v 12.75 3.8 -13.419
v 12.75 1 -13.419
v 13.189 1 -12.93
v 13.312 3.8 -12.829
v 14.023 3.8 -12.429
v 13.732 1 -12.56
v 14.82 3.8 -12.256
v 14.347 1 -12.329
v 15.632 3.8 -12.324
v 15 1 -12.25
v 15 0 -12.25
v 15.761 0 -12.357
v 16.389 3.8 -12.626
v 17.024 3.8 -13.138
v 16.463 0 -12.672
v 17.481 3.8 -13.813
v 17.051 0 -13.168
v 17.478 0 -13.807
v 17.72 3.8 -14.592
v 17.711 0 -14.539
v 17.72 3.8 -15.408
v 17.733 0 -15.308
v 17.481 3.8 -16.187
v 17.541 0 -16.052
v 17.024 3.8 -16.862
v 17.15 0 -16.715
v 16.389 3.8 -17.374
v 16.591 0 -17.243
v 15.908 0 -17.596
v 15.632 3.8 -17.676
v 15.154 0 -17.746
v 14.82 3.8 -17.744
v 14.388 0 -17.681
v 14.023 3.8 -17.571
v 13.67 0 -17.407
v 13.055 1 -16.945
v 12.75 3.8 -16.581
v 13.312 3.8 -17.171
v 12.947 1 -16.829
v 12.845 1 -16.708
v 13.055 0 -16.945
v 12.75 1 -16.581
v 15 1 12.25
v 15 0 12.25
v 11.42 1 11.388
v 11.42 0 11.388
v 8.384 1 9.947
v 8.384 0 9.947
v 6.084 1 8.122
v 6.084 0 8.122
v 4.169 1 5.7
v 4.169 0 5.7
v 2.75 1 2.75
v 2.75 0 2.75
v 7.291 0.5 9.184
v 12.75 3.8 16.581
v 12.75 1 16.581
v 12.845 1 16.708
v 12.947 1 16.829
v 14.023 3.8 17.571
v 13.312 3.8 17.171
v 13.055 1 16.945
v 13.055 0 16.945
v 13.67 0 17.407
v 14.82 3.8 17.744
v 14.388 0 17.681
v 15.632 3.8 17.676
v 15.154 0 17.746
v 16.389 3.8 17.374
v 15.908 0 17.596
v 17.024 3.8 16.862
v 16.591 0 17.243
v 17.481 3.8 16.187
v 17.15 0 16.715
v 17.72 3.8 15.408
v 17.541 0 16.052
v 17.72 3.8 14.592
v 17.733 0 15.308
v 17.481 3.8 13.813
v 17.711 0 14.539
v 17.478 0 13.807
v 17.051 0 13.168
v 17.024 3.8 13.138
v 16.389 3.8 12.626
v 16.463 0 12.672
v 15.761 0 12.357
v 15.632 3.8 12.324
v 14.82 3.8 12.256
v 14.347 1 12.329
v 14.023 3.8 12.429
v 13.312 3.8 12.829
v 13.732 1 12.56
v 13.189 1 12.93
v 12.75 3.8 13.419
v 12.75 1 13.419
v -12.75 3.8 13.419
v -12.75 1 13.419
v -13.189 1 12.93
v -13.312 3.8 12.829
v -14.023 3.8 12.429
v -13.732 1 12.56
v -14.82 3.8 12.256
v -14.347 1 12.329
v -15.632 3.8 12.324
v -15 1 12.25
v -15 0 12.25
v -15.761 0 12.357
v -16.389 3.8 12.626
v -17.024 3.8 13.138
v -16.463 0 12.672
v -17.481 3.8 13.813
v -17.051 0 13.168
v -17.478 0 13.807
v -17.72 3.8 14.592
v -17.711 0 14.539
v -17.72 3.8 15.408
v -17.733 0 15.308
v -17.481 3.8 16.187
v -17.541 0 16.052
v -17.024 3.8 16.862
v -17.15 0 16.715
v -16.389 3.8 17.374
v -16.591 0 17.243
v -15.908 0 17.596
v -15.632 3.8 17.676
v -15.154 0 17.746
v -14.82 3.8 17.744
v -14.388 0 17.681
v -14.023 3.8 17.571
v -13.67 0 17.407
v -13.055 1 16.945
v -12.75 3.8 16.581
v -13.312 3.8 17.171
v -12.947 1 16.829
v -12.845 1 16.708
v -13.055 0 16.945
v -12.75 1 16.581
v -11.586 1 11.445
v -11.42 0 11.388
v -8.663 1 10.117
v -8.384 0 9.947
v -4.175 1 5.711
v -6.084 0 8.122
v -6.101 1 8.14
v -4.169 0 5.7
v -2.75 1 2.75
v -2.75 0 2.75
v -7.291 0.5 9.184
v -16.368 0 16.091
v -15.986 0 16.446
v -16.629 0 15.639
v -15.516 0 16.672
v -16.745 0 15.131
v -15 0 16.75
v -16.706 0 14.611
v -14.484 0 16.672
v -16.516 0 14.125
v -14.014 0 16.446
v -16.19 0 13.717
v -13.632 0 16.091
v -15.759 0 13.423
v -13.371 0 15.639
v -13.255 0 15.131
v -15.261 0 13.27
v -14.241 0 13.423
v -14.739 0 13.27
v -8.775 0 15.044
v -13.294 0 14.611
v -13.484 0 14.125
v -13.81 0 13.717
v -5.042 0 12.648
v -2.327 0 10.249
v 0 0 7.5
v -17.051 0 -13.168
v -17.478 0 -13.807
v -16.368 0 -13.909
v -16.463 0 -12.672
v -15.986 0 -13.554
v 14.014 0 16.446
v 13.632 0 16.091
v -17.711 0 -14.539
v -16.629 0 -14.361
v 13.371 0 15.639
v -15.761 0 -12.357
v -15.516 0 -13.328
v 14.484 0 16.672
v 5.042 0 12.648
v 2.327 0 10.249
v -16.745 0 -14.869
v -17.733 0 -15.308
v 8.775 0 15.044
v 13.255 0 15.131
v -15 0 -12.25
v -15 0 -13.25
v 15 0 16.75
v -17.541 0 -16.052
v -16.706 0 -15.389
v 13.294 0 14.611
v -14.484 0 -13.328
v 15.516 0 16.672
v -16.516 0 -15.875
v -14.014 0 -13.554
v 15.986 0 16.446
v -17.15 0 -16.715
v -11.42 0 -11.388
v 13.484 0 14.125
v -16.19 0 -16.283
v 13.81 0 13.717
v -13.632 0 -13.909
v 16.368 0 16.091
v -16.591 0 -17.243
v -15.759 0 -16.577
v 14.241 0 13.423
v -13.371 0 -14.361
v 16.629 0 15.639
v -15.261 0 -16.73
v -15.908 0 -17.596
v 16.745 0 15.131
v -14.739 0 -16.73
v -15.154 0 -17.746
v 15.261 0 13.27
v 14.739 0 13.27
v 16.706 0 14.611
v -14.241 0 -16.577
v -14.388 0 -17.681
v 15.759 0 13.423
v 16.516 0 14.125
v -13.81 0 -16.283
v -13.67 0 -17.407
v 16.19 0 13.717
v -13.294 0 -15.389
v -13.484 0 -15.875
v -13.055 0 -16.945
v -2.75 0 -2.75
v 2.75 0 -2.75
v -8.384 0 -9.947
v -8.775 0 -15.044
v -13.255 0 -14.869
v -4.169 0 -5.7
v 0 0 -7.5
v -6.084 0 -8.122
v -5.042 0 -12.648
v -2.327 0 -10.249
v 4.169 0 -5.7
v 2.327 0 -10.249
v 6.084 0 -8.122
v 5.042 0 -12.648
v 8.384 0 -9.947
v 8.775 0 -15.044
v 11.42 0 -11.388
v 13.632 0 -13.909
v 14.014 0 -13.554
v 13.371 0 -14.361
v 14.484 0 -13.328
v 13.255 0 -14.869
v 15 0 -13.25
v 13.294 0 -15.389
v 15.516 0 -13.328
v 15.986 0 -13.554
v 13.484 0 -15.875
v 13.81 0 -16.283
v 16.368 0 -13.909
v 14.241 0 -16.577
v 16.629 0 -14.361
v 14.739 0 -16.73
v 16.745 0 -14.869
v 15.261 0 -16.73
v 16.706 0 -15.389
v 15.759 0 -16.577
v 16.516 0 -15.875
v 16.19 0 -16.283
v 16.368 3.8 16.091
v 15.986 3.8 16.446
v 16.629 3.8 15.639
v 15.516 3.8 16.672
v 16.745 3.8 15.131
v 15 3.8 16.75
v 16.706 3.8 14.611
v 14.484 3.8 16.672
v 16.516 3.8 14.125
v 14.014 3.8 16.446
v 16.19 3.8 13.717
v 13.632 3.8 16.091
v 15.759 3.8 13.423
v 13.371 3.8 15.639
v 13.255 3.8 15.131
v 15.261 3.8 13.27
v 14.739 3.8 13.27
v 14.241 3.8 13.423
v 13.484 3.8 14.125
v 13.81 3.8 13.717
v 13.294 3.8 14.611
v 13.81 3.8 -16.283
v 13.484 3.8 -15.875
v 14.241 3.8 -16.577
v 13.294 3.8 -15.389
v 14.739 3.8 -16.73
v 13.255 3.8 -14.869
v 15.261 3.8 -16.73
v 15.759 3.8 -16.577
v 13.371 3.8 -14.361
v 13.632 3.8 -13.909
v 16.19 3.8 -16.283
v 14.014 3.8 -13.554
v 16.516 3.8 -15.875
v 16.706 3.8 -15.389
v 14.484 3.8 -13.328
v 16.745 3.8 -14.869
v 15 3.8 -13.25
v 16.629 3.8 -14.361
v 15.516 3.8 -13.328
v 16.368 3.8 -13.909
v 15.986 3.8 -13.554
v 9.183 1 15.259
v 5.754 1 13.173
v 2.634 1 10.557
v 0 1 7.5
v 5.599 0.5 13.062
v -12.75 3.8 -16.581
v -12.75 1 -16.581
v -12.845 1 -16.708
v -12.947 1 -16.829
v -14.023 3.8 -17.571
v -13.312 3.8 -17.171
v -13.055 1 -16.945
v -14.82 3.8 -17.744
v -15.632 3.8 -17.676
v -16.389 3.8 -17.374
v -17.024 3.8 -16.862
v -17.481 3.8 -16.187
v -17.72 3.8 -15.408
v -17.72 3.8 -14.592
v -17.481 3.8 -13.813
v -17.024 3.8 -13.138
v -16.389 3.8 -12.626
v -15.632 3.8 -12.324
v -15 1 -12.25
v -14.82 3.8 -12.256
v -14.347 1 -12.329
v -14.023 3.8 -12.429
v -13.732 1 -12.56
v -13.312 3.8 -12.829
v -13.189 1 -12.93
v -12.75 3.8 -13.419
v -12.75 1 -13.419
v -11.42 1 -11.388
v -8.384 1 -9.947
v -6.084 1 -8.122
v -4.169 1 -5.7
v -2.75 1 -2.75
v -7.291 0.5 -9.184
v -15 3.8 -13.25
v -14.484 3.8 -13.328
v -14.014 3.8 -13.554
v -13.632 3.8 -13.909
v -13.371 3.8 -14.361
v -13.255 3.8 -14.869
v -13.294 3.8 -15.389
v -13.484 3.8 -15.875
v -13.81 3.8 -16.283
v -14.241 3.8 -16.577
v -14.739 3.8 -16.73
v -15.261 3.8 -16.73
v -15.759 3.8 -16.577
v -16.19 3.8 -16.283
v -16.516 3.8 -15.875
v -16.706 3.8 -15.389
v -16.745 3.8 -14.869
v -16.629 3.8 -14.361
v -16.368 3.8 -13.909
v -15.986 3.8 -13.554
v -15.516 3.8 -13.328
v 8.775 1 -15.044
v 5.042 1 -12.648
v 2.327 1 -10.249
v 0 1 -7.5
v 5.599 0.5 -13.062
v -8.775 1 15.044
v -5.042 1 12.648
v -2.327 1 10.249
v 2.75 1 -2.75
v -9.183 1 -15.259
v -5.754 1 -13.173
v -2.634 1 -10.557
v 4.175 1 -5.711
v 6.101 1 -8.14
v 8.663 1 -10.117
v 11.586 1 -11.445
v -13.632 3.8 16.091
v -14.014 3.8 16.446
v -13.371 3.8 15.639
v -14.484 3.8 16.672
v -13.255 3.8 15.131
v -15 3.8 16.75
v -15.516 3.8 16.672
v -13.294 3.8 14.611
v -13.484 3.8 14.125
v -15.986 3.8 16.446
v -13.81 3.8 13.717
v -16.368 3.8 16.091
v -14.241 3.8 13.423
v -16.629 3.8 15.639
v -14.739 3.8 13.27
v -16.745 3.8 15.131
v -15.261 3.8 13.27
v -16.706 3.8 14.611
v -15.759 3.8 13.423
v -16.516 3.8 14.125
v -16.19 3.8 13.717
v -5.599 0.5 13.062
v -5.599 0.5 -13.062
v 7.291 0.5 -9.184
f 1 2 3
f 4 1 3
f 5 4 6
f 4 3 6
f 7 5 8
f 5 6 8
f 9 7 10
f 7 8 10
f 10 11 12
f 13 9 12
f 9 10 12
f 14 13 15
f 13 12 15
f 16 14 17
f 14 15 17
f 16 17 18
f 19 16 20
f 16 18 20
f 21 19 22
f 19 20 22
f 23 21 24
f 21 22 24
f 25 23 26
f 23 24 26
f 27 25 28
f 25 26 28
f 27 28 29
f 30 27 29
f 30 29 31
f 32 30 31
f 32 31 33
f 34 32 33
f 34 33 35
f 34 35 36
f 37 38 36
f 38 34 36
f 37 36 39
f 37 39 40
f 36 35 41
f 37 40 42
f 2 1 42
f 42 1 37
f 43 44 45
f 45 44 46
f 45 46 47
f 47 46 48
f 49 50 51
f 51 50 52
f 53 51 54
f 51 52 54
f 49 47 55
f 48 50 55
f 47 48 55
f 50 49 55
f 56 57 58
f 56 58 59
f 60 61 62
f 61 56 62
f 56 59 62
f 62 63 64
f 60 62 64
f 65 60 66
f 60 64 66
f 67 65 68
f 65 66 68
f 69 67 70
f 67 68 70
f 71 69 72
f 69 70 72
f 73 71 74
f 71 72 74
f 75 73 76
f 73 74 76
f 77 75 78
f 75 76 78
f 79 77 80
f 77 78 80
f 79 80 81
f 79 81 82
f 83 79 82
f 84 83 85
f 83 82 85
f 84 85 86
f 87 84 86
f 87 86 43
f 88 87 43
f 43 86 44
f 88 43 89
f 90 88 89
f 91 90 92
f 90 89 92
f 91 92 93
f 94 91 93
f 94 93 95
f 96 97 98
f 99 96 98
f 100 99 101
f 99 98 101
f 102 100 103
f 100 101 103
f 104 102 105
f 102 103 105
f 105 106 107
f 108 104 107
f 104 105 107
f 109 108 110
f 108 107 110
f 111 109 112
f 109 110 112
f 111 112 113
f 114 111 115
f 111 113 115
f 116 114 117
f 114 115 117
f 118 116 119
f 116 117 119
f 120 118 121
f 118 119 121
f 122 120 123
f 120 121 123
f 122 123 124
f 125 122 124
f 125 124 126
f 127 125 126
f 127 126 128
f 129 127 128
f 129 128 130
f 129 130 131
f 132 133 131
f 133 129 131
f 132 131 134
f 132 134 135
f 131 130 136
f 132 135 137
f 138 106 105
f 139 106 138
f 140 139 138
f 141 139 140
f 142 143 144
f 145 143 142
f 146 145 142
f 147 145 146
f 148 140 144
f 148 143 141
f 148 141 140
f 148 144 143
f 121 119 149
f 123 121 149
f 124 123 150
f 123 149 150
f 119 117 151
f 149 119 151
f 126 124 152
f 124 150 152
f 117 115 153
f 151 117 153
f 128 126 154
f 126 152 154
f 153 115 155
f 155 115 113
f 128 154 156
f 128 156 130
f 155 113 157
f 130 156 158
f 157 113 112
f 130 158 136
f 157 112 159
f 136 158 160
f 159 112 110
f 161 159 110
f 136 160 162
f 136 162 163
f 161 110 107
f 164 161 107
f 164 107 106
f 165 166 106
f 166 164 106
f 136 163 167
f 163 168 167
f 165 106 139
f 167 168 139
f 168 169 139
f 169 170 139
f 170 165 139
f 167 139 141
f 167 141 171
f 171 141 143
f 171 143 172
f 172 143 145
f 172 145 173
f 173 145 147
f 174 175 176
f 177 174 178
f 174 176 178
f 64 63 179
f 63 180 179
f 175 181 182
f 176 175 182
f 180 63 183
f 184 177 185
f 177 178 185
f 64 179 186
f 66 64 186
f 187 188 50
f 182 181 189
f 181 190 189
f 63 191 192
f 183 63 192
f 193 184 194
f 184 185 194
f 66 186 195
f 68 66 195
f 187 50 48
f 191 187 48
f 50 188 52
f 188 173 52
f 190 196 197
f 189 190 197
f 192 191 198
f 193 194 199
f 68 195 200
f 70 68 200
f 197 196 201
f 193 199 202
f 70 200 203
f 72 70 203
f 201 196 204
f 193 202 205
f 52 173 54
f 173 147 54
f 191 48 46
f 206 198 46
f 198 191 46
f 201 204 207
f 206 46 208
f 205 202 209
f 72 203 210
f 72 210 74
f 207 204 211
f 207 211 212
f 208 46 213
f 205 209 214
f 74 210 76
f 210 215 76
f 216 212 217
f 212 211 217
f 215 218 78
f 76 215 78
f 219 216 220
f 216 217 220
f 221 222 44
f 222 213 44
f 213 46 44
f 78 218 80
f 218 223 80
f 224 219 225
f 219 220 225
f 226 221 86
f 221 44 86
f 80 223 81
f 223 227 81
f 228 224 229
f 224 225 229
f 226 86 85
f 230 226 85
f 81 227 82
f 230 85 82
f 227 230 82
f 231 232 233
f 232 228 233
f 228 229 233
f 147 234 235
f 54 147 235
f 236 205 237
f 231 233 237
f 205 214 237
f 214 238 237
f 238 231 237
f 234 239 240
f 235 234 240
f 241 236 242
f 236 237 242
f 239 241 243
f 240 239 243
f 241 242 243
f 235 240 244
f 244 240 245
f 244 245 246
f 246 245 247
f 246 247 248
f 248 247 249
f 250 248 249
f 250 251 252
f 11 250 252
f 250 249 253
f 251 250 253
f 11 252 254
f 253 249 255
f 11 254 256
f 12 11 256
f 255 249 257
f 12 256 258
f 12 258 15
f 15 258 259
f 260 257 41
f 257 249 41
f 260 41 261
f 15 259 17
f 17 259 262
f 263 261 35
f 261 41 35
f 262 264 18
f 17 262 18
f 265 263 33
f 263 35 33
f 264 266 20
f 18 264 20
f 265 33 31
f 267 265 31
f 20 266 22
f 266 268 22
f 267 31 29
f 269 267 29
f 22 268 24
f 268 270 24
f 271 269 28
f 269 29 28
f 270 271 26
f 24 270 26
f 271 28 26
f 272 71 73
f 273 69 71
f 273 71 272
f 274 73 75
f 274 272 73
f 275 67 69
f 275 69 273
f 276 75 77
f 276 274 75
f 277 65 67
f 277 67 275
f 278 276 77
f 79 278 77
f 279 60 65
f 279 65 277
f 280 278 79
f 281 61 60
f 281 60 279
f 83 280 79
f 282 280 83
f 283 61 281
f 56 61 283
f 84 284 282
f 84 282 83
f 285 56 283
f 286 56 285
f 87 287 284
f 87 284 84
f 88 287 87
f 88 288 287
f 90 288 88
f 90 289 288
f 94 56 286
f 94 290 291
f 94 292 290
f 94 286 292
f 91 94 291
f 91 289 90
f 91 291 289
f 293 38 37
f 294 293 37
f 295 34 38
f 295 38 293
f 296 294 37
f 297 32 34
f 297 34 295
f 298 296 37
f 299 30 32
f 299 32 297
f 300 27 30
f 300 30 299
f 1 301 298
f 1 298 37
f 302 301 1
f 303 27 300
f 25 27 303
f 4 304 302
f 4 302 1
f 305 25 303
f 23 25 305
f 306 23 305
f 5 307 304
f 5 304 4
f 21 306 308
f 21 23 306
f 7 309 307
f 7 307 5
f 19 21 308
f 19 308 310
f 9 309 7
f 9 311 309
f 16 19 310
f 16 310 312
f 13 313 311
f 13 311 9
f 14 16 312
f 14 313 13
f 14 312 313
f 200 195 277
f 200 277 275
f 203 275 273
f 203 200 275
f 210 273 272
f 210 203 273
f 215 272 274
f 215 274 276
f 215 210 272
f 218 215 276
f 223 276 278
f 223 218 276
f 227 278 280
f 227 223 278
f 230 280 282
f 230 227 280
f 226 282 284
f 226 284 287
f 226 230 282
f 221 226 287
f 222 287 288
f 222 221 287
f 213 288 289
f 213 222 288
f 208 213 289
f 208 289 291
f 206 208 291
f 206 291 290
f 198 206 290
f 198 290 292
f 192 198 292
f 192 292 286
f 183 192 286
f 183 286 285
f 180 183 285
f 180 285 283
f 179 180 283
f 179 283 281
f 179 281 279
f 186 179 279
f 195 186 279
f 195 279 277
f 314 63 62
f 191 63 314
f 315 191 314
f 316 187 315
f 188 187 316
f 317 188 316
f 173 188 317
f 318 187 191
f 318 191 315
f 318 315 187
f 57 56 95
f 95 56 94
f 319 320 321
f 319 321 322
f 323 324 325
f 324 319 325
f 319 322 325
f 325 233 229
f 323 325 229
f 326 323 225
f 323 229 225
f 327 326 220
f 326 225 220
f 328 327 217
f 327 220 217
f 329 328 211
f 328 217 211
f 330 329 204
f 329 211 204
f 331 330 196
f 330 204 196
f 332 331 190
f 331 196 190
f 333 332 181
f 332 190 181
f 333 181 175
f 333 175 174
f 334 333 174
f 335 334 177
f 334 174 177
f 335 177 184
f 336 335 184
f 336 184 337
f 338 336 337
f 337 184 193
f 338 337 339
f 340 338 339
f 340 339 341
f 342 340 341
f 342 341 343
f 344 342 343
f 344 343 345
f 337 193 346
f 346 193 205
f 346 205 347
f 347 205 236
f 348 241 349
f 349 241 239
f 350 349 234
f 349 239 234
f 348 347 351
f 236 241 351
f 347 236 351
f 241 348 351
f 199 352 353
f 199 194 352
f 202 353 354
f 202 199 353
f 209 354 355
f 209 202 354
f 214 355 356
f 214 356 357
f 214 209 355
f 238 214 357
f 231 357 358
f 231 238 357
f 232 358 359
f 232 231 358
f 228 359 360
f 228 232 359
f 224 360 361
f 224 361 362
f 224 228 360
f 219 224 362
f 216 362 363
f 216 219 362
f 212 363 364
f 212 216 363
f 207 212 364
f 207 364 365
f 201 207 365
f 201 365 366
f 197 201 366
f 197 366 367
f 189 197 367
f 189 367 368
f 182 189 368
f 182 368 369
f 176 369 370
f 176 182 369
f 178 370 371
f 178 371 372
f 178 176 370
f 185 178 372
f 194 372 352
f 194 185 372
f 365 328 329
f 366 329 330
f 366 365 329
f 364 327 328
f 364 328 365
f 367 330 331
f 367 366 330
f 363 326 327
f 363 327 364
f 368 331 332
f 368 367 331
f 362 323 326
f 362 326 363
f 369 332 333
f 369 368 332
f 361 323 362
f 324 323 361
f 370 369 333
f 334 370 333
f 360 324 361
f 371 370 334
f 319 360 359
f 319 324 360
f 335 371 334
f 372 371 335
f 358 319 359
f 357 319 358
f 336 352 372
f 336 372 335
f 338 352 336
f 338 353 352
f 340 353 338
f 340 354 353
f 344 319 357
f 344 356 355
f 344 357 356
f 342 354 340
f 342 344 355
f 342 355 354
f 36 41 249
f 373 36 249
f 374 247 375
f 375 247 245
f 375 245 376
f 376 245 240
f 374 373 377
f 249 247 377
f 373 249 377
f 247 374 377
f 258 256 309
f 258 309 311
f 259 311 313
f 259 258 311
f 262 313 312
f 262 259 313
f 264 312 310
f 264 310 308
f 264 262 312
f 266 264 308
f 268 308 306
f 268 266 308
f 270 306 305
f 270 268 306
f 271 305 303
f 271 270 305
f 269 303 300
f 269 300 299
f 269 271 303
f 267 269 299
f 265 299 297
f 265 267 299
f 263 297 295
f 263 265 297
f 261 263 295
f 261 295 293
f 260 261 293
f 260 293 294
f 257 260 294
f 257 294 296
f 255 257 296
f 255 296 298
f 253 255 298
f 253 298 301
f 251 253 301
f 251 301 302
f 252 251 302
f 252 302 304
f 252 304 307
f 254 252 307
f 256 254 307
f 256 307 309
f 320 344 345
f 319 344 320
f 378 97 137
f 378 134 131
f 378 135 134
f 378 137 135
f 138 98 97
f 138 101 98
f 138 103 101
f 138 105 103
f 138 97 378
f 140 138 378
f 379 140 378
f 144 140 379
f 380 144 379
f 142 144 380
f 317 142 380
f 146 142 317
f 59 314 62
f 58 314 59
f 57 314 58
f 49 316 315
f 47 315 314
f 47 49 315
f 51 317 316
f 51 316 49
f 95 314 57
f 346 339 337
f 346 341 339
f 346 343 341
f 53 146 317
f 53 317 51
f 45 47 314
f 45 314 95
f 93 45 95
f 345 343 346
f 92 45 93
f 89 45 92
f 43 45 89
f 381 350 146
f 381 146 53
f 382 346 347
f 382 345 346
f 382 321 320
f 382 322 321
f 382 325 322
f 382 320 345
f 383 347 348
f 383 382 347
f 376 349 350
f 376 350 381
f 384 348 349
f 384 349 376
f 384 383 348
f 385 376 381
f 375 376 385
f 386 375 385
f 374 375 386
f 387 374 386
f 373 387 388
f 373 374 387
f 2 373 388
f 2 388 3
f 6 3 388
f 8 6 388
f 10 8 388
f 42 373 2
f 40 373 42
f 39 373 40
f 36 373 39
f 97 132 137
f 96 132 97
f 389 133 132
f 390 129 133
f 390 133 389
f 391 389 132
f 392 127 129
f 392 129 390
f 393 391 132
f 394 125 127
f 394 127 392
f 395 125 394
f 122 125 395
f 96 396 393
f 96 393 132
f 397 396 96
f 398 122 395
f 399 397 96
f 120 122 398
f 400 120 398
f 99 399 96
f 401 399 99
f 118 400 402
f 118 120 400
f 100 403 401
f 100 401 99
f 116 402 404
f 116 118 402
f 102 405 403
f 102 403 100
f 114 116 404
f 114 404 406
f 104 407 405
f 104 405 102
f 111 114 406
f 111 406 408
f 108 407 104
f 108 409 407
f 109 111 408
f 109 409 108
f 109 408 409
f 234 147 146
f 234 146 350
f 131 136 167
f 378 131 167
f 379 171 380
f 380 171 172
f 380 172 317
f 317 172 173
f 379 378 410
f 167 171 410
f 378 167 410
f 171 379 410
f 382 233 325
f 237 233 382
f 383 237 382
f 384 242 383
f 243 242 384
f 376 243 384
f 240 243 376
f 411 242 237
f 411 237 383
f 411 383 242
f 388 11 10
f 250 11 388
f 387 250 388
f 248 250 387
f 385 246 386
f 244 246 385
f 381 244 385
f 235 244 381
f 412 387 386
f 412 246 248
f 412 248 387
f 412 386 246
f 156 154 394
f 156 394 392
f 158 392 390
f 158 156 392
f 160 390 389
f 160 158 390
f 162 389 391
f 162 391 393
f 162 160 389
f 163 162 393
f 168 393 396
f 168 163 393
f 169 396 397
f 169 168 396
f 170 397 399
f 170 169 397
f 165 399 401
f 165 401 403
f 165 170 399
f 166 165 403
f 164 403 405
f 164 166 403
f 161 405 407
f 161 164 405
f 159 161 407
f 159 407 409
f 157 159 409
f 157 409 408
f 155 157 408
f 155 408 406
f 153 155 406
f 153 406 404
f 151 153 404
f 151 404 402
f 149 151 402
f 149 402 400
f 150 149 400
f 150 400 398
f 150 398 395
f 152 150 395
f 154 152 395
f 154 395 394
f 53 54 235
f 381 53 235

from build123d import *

# Parameters (mm, degrees)
SKETCH1_R           = 2.75
SKETCH1_R_2         = 1.75
SKETCH1_W           = 5.5
SKETCH1_H           = 5.5
BOSS_EXTRUDE1_DEPTH = 1
SKETCH2_R           = 2.75
SKETCH2_R_2         = 1.75
BOSS_EXTRUDE2_DEPTH = 2.8
SKETCH3_W           = 25.5
SKETCH3_H           = 35.5
CUT_EXTRUDE1_DEPTH  = 2.8


with BuildPart() as part:
    # Sketch1 → Boss-Extrude1 (new body)
    # profile 1 of 11: a face of its own
    with BuildSketch(Plane(origin=(0, 0, 0), x_dir=(1, 0, 0), z_dir=(0, 1, 0))):
        with Locations((-15, -15)):
            Circle(SKETCH1_R)
        with Locations(Location((-15, -15, 0), (0, 0, 270))):
            Circle(SKETCH1_R_2, mode=Mode.SUBTRACT)
    # profile 2 of 11: a face of its own
    with BuildSketch(Plane(origin=(0, 0, 0), x_dir=(1, 0, 0), z_dir=(0, 1, 0))):
        with BuildLine():
            add(Edge.make_bspline(
                [(0, -7.5), (-1.590584075, -5.319747163), (-2.75, -2.75)],
                knots=[0.745921805, 0.745921805, 0.745921805, 1, 1, 1], degree=2))
            add(Edge.make_bspline(
                [(-15, -12.25), (-5.706246464, -10.868692238), (-2.75, -2.75)],
                knots=[0, 0, 0, 1, 1, 1], degree=2))
            ThreePointArc((-15, -12.25), (-13.055456352, -13.055456352), (-12.25, -15))
            ThreePointArc((-12.25, -15), (-12.459331286, -16.052379439), (-13.055456352, -16.944543648))
            add(Edge.make_bspline(
                [(-13.055456352, -16.944543648), (-4.669630712, -13.900778032), (0, -7.5)],
                knots=[0, 0, 0, 0.745921805, 0.745921805, 0.745921805], degree=2))
        make_face()
    # profile 3 of 11: a face of its own
    with BuildSketch(Plane(origin=(0, 0, 0), x_dir=(1, 0, 0), z_dir=(0, 1, 0))):
        with BuildLine():
            add(Edge.make_bspline(
                [(0, -7.5), (1.590584075, -5.319747163), (2.75, -2.75)],
                knots=[0.745921805, 0.745921805, 0.745921805, 1, 1, 1], degree=2))
            Line((2.75, -2.75), (-2.75, -2.75))
            add(Edge.make_bspline(
                [(0, -7.5), (-1.590584075, -5.319747163), (-2.75, -2.75)],
                knots=[0.745921805, 0.745921805, 0.745921805, 1, 1, 1], degree=2))
        make_face()
    # profile 4 of 11: a face of its own
    with BuildSketch(Plane(origin=(0, 0, 0), x_dir=(1, 0, 0), z_dir=(0, 1, 0))):
        Rectangle(SKETCH1_W, SKETCH1_H)
    # profile 5 of 11: a face of its own
    with BuildSketch(Plane(origin=(0, 0, 0), x_dir=(1, 0, 0), z_dir=(0, 1, 0))):
        with BuildLine():
            add(Edge.make_bspline(
                [(15, -12.25), (5.706246464, -10.868692238), (2.75, -2.75)],
                knots=[0, 0, 0, 1, 1, 1], degree=2))
            add(Edge.make_bspline(
                [(0, -7.5), (1.590584075, -5.319747163), (2.75, -2.75)],
                knots=[0.745921805, 0.745921805, 0.745921805, 1, 1, 1], degree=2))
            add(Edge.make_bspline(
                [(13.055456352, -16.944543648), (4.669630712, -13.900778032), (0, -7.5)],
                knots=[0, 0, 0, 0.745921805, 0.745921805, 0.745921805], degree=2))
            ThreePointArc((13.055456352, -16.944543648), (12.459331286, -13.947620561), (15, -12.25))
        make_face()
    # profile 6 of 11: a face of its own
    with BuildSketch(Plane(origin=(0, 0, 0), x_dir=(1, 0, 0), z_dir=(0, 1, 0))):
        with Locations((15, -15)):
            Circle(SKETCH1_R)
        with Locations(Location((15, -15, 0), (0, 0, 270))):
            Circle(SKETCH1_R_2, mode=Mode.SUBTRACT)
    # profile 7 of 11: a face of its own
    with BuildSketch(Plane(origin=(0, 0, 0), x_dir=(1, 0, 0), z_dir=(0, 1, 0))):
        with BuildLine():
            add(Edge.make_bspline(
                [(0, 7.5), (1.590584075, 5.319747163), (2.75, 2.75)],
                knots=[0.745921805, 0.745921805, 0.745921805, 1, 1, 1], degree=2))
            add(Edge.make_bspline(
                [(15, 12.25), (5.706246464, 10.868692238), (2.75, 2.75)],
                knots=[0, 0, 0, 1, 1, 1], degree=2))
            ThreePointArc((15, 12.25), (12.459331286, 13.947620561), (13.055456352, 16.944543648))
            add(Edge.make_bspline(
                [(13.055456352, 16.944543648), (4.669630712, 13.900778032), (0, 7.5)],
                knots=[0, 0, 0, 0.745921805, 0.745921805, 0.745921805], degree=2))
        make_face()
    # profile 8 of 11: a face of its own
    with BuildSketch(Plane(origin=(0, 0, 0), x_dir=(1, 0, 0), z_dir=(0, 1, 0))):
        with Locations((15, 15)):
            Circle(SKETCH1_R)
        with Locations(Location((15, 15, 0), (0, 0, 270))):
            Circle(SKETCH1_R_2, mode=Mode.SUBTRACT)
    # profile 9 of 11: a face of its own
    with BuildSketch(Plane(origin=(0, 0, 0), x_dir=(1, 0, 0), z_dir=(0, 1, 0))):
        with BuildLine():
            Line((-2.75, 2.75), (2.75, 2.75))
            add(Edge.make_bspline(
                [(0, 7.5), (1.590584075, 5.319747163), (2.75, 2.75)],
                knots=[0.745921805, 0.745921805, 0.745921805, 1, 1, 1], degree=2))
            add(Edge.make_bspline(
                [(0, 7.5), (-1.590584075, 5.319747163), (-2.75, 2.75)],
                knots=[0.745921805, 0.745921805, 0.745921805, 1, 1, 1], degree=2))
        make_face()
    # profile 10 of 11: a face of its own
    with BuildSketch(Plane(origin=(0, 0, 0), x_dir=(1, 0, 0), z_dir=(0, 1, 0))):
        with BuildLine():
            add(Edge.make_bspline(
                [(-15, 12.25), (-5.706246464, 10.868692238), (-2.75, 2.75)],
                knots=[0, 0, 0, 1, 1, 1], degree=2))
            add(Edge.make_bspline(
                [(0, 7.5), (-1.590584075, 5.319747163), (-2.75, 2.75)],
                knots=[0.745921805, 0.745921805, 0.745921805, 1, 1, 1], degree=2))
            add(Edge.make_bspline(
                [(-13.055456352, 16.944543648), (-4.669630712, 13.900778032), (0, 7.5)],
                knots=[0, 0, 0, 0.745921805, 0.745921805, 0.745921805], degree=2))
            ThreePointArc((-13.055456352, 16.944543648), (-12.459331286, 16.052379439), (-12.25, 15))
            ThreePointArc((-12.25, 15), (-13.055456352, 13.055456352), (-15, 12.25))
        make_face()
    # profile 11 of 11: a face of its own
    with BuildSketch(Plane(origin=(0, 0, 0), x_dir=(1, 0, 0), z_dir=(0, 1, 0))):
        with Locations((-15, 15)):
            Circle(SKETCH1_R)
        with Locations(Location((-15, 15, 0), (0, 0, 270))):
            Circle(SKETCH1_R_2, mode=Mode.SUBTRACT)
    extrude(amount=BOSS_EXTRUDE1_DEPTH)

    # Sketch2 → Boss-Extrude2 (add)
    # profile 1 of 4: a face of its own
    with BuildSketch(Plane(origin=(0, 1, 0), x_dir=(1, 0, 0), z_dir=(0, 1, 0))):
        with Locations(Location((-15, 15, 0), (0, 0, 270))):
            Circle(SKETCH2_R)
        with Locations(Location((-15, 15, 0), (0, 0, 270))):
            Circle(SKETCH2_R_2, mode=Mode.SUBTRACT)
    # profile 2 of 4: a face of its own
    with BuildSketch(Plane(origin=(0, 1, 0), x_dir=(1, 0, 0), z_dir=(0, 1, 0))):
        with Locations(Location((15, 15, 0), (0, 0, 270))):
            Circle(SKETCH2_R)
        with Locations(Location((15, 15, 0), (0, 0, 270))):
            Circle(SKETCH2_R_2, mode=Mode.SUBTRACT)
    # profile 3 of 4: a face of its own
    with BuildSketch(Plane(origin=(0, 1, 0), x_dir=(1, 0, 0), z_dir=(0, 1, 0))):
        with Locations(Location((15, -15, 0), (0, 0, 90))):
            Circle(SKETCH2_R)
        with Locations(Location((15, -15, 0), (0, 0, 270))):
            Circle(SKETCH2_R_2, mode=Mode.SUBTRACT)
    # profile 4 of 4: a face of its own
    with BuildSketch(Plane(origin=(0, 1, 0), x_dir=(1, 0, 0), z_dir=(0, 1, 0))):
        with Locations(Location((-15, -15, 0), (0, 0, 90))):
            Circle(SKETCH2_R)
        with Locations(Location((-15, -15, 0), (0, 0, 270))):
            Circle(SKETCH2_R_2, mode=Mode.SUBTRACT)
    extrude(amount=BOSS_EXTRUDE2_DEPTH)

    # Sketch3 → Cut-Extrude1 (cut)
    with BuildSketch(Plane(origin=(0, 3.8, 0), x_dir=(1, 0, 0), z_dir=(0, 1, 0))):
        Rectangle(SKETCH3_W, SKETCH3_H)
    extrude(amount=-CUT_EXTRUDE1_DEPTH, mode=Mode.SUBTRACT)


solid = part.part
